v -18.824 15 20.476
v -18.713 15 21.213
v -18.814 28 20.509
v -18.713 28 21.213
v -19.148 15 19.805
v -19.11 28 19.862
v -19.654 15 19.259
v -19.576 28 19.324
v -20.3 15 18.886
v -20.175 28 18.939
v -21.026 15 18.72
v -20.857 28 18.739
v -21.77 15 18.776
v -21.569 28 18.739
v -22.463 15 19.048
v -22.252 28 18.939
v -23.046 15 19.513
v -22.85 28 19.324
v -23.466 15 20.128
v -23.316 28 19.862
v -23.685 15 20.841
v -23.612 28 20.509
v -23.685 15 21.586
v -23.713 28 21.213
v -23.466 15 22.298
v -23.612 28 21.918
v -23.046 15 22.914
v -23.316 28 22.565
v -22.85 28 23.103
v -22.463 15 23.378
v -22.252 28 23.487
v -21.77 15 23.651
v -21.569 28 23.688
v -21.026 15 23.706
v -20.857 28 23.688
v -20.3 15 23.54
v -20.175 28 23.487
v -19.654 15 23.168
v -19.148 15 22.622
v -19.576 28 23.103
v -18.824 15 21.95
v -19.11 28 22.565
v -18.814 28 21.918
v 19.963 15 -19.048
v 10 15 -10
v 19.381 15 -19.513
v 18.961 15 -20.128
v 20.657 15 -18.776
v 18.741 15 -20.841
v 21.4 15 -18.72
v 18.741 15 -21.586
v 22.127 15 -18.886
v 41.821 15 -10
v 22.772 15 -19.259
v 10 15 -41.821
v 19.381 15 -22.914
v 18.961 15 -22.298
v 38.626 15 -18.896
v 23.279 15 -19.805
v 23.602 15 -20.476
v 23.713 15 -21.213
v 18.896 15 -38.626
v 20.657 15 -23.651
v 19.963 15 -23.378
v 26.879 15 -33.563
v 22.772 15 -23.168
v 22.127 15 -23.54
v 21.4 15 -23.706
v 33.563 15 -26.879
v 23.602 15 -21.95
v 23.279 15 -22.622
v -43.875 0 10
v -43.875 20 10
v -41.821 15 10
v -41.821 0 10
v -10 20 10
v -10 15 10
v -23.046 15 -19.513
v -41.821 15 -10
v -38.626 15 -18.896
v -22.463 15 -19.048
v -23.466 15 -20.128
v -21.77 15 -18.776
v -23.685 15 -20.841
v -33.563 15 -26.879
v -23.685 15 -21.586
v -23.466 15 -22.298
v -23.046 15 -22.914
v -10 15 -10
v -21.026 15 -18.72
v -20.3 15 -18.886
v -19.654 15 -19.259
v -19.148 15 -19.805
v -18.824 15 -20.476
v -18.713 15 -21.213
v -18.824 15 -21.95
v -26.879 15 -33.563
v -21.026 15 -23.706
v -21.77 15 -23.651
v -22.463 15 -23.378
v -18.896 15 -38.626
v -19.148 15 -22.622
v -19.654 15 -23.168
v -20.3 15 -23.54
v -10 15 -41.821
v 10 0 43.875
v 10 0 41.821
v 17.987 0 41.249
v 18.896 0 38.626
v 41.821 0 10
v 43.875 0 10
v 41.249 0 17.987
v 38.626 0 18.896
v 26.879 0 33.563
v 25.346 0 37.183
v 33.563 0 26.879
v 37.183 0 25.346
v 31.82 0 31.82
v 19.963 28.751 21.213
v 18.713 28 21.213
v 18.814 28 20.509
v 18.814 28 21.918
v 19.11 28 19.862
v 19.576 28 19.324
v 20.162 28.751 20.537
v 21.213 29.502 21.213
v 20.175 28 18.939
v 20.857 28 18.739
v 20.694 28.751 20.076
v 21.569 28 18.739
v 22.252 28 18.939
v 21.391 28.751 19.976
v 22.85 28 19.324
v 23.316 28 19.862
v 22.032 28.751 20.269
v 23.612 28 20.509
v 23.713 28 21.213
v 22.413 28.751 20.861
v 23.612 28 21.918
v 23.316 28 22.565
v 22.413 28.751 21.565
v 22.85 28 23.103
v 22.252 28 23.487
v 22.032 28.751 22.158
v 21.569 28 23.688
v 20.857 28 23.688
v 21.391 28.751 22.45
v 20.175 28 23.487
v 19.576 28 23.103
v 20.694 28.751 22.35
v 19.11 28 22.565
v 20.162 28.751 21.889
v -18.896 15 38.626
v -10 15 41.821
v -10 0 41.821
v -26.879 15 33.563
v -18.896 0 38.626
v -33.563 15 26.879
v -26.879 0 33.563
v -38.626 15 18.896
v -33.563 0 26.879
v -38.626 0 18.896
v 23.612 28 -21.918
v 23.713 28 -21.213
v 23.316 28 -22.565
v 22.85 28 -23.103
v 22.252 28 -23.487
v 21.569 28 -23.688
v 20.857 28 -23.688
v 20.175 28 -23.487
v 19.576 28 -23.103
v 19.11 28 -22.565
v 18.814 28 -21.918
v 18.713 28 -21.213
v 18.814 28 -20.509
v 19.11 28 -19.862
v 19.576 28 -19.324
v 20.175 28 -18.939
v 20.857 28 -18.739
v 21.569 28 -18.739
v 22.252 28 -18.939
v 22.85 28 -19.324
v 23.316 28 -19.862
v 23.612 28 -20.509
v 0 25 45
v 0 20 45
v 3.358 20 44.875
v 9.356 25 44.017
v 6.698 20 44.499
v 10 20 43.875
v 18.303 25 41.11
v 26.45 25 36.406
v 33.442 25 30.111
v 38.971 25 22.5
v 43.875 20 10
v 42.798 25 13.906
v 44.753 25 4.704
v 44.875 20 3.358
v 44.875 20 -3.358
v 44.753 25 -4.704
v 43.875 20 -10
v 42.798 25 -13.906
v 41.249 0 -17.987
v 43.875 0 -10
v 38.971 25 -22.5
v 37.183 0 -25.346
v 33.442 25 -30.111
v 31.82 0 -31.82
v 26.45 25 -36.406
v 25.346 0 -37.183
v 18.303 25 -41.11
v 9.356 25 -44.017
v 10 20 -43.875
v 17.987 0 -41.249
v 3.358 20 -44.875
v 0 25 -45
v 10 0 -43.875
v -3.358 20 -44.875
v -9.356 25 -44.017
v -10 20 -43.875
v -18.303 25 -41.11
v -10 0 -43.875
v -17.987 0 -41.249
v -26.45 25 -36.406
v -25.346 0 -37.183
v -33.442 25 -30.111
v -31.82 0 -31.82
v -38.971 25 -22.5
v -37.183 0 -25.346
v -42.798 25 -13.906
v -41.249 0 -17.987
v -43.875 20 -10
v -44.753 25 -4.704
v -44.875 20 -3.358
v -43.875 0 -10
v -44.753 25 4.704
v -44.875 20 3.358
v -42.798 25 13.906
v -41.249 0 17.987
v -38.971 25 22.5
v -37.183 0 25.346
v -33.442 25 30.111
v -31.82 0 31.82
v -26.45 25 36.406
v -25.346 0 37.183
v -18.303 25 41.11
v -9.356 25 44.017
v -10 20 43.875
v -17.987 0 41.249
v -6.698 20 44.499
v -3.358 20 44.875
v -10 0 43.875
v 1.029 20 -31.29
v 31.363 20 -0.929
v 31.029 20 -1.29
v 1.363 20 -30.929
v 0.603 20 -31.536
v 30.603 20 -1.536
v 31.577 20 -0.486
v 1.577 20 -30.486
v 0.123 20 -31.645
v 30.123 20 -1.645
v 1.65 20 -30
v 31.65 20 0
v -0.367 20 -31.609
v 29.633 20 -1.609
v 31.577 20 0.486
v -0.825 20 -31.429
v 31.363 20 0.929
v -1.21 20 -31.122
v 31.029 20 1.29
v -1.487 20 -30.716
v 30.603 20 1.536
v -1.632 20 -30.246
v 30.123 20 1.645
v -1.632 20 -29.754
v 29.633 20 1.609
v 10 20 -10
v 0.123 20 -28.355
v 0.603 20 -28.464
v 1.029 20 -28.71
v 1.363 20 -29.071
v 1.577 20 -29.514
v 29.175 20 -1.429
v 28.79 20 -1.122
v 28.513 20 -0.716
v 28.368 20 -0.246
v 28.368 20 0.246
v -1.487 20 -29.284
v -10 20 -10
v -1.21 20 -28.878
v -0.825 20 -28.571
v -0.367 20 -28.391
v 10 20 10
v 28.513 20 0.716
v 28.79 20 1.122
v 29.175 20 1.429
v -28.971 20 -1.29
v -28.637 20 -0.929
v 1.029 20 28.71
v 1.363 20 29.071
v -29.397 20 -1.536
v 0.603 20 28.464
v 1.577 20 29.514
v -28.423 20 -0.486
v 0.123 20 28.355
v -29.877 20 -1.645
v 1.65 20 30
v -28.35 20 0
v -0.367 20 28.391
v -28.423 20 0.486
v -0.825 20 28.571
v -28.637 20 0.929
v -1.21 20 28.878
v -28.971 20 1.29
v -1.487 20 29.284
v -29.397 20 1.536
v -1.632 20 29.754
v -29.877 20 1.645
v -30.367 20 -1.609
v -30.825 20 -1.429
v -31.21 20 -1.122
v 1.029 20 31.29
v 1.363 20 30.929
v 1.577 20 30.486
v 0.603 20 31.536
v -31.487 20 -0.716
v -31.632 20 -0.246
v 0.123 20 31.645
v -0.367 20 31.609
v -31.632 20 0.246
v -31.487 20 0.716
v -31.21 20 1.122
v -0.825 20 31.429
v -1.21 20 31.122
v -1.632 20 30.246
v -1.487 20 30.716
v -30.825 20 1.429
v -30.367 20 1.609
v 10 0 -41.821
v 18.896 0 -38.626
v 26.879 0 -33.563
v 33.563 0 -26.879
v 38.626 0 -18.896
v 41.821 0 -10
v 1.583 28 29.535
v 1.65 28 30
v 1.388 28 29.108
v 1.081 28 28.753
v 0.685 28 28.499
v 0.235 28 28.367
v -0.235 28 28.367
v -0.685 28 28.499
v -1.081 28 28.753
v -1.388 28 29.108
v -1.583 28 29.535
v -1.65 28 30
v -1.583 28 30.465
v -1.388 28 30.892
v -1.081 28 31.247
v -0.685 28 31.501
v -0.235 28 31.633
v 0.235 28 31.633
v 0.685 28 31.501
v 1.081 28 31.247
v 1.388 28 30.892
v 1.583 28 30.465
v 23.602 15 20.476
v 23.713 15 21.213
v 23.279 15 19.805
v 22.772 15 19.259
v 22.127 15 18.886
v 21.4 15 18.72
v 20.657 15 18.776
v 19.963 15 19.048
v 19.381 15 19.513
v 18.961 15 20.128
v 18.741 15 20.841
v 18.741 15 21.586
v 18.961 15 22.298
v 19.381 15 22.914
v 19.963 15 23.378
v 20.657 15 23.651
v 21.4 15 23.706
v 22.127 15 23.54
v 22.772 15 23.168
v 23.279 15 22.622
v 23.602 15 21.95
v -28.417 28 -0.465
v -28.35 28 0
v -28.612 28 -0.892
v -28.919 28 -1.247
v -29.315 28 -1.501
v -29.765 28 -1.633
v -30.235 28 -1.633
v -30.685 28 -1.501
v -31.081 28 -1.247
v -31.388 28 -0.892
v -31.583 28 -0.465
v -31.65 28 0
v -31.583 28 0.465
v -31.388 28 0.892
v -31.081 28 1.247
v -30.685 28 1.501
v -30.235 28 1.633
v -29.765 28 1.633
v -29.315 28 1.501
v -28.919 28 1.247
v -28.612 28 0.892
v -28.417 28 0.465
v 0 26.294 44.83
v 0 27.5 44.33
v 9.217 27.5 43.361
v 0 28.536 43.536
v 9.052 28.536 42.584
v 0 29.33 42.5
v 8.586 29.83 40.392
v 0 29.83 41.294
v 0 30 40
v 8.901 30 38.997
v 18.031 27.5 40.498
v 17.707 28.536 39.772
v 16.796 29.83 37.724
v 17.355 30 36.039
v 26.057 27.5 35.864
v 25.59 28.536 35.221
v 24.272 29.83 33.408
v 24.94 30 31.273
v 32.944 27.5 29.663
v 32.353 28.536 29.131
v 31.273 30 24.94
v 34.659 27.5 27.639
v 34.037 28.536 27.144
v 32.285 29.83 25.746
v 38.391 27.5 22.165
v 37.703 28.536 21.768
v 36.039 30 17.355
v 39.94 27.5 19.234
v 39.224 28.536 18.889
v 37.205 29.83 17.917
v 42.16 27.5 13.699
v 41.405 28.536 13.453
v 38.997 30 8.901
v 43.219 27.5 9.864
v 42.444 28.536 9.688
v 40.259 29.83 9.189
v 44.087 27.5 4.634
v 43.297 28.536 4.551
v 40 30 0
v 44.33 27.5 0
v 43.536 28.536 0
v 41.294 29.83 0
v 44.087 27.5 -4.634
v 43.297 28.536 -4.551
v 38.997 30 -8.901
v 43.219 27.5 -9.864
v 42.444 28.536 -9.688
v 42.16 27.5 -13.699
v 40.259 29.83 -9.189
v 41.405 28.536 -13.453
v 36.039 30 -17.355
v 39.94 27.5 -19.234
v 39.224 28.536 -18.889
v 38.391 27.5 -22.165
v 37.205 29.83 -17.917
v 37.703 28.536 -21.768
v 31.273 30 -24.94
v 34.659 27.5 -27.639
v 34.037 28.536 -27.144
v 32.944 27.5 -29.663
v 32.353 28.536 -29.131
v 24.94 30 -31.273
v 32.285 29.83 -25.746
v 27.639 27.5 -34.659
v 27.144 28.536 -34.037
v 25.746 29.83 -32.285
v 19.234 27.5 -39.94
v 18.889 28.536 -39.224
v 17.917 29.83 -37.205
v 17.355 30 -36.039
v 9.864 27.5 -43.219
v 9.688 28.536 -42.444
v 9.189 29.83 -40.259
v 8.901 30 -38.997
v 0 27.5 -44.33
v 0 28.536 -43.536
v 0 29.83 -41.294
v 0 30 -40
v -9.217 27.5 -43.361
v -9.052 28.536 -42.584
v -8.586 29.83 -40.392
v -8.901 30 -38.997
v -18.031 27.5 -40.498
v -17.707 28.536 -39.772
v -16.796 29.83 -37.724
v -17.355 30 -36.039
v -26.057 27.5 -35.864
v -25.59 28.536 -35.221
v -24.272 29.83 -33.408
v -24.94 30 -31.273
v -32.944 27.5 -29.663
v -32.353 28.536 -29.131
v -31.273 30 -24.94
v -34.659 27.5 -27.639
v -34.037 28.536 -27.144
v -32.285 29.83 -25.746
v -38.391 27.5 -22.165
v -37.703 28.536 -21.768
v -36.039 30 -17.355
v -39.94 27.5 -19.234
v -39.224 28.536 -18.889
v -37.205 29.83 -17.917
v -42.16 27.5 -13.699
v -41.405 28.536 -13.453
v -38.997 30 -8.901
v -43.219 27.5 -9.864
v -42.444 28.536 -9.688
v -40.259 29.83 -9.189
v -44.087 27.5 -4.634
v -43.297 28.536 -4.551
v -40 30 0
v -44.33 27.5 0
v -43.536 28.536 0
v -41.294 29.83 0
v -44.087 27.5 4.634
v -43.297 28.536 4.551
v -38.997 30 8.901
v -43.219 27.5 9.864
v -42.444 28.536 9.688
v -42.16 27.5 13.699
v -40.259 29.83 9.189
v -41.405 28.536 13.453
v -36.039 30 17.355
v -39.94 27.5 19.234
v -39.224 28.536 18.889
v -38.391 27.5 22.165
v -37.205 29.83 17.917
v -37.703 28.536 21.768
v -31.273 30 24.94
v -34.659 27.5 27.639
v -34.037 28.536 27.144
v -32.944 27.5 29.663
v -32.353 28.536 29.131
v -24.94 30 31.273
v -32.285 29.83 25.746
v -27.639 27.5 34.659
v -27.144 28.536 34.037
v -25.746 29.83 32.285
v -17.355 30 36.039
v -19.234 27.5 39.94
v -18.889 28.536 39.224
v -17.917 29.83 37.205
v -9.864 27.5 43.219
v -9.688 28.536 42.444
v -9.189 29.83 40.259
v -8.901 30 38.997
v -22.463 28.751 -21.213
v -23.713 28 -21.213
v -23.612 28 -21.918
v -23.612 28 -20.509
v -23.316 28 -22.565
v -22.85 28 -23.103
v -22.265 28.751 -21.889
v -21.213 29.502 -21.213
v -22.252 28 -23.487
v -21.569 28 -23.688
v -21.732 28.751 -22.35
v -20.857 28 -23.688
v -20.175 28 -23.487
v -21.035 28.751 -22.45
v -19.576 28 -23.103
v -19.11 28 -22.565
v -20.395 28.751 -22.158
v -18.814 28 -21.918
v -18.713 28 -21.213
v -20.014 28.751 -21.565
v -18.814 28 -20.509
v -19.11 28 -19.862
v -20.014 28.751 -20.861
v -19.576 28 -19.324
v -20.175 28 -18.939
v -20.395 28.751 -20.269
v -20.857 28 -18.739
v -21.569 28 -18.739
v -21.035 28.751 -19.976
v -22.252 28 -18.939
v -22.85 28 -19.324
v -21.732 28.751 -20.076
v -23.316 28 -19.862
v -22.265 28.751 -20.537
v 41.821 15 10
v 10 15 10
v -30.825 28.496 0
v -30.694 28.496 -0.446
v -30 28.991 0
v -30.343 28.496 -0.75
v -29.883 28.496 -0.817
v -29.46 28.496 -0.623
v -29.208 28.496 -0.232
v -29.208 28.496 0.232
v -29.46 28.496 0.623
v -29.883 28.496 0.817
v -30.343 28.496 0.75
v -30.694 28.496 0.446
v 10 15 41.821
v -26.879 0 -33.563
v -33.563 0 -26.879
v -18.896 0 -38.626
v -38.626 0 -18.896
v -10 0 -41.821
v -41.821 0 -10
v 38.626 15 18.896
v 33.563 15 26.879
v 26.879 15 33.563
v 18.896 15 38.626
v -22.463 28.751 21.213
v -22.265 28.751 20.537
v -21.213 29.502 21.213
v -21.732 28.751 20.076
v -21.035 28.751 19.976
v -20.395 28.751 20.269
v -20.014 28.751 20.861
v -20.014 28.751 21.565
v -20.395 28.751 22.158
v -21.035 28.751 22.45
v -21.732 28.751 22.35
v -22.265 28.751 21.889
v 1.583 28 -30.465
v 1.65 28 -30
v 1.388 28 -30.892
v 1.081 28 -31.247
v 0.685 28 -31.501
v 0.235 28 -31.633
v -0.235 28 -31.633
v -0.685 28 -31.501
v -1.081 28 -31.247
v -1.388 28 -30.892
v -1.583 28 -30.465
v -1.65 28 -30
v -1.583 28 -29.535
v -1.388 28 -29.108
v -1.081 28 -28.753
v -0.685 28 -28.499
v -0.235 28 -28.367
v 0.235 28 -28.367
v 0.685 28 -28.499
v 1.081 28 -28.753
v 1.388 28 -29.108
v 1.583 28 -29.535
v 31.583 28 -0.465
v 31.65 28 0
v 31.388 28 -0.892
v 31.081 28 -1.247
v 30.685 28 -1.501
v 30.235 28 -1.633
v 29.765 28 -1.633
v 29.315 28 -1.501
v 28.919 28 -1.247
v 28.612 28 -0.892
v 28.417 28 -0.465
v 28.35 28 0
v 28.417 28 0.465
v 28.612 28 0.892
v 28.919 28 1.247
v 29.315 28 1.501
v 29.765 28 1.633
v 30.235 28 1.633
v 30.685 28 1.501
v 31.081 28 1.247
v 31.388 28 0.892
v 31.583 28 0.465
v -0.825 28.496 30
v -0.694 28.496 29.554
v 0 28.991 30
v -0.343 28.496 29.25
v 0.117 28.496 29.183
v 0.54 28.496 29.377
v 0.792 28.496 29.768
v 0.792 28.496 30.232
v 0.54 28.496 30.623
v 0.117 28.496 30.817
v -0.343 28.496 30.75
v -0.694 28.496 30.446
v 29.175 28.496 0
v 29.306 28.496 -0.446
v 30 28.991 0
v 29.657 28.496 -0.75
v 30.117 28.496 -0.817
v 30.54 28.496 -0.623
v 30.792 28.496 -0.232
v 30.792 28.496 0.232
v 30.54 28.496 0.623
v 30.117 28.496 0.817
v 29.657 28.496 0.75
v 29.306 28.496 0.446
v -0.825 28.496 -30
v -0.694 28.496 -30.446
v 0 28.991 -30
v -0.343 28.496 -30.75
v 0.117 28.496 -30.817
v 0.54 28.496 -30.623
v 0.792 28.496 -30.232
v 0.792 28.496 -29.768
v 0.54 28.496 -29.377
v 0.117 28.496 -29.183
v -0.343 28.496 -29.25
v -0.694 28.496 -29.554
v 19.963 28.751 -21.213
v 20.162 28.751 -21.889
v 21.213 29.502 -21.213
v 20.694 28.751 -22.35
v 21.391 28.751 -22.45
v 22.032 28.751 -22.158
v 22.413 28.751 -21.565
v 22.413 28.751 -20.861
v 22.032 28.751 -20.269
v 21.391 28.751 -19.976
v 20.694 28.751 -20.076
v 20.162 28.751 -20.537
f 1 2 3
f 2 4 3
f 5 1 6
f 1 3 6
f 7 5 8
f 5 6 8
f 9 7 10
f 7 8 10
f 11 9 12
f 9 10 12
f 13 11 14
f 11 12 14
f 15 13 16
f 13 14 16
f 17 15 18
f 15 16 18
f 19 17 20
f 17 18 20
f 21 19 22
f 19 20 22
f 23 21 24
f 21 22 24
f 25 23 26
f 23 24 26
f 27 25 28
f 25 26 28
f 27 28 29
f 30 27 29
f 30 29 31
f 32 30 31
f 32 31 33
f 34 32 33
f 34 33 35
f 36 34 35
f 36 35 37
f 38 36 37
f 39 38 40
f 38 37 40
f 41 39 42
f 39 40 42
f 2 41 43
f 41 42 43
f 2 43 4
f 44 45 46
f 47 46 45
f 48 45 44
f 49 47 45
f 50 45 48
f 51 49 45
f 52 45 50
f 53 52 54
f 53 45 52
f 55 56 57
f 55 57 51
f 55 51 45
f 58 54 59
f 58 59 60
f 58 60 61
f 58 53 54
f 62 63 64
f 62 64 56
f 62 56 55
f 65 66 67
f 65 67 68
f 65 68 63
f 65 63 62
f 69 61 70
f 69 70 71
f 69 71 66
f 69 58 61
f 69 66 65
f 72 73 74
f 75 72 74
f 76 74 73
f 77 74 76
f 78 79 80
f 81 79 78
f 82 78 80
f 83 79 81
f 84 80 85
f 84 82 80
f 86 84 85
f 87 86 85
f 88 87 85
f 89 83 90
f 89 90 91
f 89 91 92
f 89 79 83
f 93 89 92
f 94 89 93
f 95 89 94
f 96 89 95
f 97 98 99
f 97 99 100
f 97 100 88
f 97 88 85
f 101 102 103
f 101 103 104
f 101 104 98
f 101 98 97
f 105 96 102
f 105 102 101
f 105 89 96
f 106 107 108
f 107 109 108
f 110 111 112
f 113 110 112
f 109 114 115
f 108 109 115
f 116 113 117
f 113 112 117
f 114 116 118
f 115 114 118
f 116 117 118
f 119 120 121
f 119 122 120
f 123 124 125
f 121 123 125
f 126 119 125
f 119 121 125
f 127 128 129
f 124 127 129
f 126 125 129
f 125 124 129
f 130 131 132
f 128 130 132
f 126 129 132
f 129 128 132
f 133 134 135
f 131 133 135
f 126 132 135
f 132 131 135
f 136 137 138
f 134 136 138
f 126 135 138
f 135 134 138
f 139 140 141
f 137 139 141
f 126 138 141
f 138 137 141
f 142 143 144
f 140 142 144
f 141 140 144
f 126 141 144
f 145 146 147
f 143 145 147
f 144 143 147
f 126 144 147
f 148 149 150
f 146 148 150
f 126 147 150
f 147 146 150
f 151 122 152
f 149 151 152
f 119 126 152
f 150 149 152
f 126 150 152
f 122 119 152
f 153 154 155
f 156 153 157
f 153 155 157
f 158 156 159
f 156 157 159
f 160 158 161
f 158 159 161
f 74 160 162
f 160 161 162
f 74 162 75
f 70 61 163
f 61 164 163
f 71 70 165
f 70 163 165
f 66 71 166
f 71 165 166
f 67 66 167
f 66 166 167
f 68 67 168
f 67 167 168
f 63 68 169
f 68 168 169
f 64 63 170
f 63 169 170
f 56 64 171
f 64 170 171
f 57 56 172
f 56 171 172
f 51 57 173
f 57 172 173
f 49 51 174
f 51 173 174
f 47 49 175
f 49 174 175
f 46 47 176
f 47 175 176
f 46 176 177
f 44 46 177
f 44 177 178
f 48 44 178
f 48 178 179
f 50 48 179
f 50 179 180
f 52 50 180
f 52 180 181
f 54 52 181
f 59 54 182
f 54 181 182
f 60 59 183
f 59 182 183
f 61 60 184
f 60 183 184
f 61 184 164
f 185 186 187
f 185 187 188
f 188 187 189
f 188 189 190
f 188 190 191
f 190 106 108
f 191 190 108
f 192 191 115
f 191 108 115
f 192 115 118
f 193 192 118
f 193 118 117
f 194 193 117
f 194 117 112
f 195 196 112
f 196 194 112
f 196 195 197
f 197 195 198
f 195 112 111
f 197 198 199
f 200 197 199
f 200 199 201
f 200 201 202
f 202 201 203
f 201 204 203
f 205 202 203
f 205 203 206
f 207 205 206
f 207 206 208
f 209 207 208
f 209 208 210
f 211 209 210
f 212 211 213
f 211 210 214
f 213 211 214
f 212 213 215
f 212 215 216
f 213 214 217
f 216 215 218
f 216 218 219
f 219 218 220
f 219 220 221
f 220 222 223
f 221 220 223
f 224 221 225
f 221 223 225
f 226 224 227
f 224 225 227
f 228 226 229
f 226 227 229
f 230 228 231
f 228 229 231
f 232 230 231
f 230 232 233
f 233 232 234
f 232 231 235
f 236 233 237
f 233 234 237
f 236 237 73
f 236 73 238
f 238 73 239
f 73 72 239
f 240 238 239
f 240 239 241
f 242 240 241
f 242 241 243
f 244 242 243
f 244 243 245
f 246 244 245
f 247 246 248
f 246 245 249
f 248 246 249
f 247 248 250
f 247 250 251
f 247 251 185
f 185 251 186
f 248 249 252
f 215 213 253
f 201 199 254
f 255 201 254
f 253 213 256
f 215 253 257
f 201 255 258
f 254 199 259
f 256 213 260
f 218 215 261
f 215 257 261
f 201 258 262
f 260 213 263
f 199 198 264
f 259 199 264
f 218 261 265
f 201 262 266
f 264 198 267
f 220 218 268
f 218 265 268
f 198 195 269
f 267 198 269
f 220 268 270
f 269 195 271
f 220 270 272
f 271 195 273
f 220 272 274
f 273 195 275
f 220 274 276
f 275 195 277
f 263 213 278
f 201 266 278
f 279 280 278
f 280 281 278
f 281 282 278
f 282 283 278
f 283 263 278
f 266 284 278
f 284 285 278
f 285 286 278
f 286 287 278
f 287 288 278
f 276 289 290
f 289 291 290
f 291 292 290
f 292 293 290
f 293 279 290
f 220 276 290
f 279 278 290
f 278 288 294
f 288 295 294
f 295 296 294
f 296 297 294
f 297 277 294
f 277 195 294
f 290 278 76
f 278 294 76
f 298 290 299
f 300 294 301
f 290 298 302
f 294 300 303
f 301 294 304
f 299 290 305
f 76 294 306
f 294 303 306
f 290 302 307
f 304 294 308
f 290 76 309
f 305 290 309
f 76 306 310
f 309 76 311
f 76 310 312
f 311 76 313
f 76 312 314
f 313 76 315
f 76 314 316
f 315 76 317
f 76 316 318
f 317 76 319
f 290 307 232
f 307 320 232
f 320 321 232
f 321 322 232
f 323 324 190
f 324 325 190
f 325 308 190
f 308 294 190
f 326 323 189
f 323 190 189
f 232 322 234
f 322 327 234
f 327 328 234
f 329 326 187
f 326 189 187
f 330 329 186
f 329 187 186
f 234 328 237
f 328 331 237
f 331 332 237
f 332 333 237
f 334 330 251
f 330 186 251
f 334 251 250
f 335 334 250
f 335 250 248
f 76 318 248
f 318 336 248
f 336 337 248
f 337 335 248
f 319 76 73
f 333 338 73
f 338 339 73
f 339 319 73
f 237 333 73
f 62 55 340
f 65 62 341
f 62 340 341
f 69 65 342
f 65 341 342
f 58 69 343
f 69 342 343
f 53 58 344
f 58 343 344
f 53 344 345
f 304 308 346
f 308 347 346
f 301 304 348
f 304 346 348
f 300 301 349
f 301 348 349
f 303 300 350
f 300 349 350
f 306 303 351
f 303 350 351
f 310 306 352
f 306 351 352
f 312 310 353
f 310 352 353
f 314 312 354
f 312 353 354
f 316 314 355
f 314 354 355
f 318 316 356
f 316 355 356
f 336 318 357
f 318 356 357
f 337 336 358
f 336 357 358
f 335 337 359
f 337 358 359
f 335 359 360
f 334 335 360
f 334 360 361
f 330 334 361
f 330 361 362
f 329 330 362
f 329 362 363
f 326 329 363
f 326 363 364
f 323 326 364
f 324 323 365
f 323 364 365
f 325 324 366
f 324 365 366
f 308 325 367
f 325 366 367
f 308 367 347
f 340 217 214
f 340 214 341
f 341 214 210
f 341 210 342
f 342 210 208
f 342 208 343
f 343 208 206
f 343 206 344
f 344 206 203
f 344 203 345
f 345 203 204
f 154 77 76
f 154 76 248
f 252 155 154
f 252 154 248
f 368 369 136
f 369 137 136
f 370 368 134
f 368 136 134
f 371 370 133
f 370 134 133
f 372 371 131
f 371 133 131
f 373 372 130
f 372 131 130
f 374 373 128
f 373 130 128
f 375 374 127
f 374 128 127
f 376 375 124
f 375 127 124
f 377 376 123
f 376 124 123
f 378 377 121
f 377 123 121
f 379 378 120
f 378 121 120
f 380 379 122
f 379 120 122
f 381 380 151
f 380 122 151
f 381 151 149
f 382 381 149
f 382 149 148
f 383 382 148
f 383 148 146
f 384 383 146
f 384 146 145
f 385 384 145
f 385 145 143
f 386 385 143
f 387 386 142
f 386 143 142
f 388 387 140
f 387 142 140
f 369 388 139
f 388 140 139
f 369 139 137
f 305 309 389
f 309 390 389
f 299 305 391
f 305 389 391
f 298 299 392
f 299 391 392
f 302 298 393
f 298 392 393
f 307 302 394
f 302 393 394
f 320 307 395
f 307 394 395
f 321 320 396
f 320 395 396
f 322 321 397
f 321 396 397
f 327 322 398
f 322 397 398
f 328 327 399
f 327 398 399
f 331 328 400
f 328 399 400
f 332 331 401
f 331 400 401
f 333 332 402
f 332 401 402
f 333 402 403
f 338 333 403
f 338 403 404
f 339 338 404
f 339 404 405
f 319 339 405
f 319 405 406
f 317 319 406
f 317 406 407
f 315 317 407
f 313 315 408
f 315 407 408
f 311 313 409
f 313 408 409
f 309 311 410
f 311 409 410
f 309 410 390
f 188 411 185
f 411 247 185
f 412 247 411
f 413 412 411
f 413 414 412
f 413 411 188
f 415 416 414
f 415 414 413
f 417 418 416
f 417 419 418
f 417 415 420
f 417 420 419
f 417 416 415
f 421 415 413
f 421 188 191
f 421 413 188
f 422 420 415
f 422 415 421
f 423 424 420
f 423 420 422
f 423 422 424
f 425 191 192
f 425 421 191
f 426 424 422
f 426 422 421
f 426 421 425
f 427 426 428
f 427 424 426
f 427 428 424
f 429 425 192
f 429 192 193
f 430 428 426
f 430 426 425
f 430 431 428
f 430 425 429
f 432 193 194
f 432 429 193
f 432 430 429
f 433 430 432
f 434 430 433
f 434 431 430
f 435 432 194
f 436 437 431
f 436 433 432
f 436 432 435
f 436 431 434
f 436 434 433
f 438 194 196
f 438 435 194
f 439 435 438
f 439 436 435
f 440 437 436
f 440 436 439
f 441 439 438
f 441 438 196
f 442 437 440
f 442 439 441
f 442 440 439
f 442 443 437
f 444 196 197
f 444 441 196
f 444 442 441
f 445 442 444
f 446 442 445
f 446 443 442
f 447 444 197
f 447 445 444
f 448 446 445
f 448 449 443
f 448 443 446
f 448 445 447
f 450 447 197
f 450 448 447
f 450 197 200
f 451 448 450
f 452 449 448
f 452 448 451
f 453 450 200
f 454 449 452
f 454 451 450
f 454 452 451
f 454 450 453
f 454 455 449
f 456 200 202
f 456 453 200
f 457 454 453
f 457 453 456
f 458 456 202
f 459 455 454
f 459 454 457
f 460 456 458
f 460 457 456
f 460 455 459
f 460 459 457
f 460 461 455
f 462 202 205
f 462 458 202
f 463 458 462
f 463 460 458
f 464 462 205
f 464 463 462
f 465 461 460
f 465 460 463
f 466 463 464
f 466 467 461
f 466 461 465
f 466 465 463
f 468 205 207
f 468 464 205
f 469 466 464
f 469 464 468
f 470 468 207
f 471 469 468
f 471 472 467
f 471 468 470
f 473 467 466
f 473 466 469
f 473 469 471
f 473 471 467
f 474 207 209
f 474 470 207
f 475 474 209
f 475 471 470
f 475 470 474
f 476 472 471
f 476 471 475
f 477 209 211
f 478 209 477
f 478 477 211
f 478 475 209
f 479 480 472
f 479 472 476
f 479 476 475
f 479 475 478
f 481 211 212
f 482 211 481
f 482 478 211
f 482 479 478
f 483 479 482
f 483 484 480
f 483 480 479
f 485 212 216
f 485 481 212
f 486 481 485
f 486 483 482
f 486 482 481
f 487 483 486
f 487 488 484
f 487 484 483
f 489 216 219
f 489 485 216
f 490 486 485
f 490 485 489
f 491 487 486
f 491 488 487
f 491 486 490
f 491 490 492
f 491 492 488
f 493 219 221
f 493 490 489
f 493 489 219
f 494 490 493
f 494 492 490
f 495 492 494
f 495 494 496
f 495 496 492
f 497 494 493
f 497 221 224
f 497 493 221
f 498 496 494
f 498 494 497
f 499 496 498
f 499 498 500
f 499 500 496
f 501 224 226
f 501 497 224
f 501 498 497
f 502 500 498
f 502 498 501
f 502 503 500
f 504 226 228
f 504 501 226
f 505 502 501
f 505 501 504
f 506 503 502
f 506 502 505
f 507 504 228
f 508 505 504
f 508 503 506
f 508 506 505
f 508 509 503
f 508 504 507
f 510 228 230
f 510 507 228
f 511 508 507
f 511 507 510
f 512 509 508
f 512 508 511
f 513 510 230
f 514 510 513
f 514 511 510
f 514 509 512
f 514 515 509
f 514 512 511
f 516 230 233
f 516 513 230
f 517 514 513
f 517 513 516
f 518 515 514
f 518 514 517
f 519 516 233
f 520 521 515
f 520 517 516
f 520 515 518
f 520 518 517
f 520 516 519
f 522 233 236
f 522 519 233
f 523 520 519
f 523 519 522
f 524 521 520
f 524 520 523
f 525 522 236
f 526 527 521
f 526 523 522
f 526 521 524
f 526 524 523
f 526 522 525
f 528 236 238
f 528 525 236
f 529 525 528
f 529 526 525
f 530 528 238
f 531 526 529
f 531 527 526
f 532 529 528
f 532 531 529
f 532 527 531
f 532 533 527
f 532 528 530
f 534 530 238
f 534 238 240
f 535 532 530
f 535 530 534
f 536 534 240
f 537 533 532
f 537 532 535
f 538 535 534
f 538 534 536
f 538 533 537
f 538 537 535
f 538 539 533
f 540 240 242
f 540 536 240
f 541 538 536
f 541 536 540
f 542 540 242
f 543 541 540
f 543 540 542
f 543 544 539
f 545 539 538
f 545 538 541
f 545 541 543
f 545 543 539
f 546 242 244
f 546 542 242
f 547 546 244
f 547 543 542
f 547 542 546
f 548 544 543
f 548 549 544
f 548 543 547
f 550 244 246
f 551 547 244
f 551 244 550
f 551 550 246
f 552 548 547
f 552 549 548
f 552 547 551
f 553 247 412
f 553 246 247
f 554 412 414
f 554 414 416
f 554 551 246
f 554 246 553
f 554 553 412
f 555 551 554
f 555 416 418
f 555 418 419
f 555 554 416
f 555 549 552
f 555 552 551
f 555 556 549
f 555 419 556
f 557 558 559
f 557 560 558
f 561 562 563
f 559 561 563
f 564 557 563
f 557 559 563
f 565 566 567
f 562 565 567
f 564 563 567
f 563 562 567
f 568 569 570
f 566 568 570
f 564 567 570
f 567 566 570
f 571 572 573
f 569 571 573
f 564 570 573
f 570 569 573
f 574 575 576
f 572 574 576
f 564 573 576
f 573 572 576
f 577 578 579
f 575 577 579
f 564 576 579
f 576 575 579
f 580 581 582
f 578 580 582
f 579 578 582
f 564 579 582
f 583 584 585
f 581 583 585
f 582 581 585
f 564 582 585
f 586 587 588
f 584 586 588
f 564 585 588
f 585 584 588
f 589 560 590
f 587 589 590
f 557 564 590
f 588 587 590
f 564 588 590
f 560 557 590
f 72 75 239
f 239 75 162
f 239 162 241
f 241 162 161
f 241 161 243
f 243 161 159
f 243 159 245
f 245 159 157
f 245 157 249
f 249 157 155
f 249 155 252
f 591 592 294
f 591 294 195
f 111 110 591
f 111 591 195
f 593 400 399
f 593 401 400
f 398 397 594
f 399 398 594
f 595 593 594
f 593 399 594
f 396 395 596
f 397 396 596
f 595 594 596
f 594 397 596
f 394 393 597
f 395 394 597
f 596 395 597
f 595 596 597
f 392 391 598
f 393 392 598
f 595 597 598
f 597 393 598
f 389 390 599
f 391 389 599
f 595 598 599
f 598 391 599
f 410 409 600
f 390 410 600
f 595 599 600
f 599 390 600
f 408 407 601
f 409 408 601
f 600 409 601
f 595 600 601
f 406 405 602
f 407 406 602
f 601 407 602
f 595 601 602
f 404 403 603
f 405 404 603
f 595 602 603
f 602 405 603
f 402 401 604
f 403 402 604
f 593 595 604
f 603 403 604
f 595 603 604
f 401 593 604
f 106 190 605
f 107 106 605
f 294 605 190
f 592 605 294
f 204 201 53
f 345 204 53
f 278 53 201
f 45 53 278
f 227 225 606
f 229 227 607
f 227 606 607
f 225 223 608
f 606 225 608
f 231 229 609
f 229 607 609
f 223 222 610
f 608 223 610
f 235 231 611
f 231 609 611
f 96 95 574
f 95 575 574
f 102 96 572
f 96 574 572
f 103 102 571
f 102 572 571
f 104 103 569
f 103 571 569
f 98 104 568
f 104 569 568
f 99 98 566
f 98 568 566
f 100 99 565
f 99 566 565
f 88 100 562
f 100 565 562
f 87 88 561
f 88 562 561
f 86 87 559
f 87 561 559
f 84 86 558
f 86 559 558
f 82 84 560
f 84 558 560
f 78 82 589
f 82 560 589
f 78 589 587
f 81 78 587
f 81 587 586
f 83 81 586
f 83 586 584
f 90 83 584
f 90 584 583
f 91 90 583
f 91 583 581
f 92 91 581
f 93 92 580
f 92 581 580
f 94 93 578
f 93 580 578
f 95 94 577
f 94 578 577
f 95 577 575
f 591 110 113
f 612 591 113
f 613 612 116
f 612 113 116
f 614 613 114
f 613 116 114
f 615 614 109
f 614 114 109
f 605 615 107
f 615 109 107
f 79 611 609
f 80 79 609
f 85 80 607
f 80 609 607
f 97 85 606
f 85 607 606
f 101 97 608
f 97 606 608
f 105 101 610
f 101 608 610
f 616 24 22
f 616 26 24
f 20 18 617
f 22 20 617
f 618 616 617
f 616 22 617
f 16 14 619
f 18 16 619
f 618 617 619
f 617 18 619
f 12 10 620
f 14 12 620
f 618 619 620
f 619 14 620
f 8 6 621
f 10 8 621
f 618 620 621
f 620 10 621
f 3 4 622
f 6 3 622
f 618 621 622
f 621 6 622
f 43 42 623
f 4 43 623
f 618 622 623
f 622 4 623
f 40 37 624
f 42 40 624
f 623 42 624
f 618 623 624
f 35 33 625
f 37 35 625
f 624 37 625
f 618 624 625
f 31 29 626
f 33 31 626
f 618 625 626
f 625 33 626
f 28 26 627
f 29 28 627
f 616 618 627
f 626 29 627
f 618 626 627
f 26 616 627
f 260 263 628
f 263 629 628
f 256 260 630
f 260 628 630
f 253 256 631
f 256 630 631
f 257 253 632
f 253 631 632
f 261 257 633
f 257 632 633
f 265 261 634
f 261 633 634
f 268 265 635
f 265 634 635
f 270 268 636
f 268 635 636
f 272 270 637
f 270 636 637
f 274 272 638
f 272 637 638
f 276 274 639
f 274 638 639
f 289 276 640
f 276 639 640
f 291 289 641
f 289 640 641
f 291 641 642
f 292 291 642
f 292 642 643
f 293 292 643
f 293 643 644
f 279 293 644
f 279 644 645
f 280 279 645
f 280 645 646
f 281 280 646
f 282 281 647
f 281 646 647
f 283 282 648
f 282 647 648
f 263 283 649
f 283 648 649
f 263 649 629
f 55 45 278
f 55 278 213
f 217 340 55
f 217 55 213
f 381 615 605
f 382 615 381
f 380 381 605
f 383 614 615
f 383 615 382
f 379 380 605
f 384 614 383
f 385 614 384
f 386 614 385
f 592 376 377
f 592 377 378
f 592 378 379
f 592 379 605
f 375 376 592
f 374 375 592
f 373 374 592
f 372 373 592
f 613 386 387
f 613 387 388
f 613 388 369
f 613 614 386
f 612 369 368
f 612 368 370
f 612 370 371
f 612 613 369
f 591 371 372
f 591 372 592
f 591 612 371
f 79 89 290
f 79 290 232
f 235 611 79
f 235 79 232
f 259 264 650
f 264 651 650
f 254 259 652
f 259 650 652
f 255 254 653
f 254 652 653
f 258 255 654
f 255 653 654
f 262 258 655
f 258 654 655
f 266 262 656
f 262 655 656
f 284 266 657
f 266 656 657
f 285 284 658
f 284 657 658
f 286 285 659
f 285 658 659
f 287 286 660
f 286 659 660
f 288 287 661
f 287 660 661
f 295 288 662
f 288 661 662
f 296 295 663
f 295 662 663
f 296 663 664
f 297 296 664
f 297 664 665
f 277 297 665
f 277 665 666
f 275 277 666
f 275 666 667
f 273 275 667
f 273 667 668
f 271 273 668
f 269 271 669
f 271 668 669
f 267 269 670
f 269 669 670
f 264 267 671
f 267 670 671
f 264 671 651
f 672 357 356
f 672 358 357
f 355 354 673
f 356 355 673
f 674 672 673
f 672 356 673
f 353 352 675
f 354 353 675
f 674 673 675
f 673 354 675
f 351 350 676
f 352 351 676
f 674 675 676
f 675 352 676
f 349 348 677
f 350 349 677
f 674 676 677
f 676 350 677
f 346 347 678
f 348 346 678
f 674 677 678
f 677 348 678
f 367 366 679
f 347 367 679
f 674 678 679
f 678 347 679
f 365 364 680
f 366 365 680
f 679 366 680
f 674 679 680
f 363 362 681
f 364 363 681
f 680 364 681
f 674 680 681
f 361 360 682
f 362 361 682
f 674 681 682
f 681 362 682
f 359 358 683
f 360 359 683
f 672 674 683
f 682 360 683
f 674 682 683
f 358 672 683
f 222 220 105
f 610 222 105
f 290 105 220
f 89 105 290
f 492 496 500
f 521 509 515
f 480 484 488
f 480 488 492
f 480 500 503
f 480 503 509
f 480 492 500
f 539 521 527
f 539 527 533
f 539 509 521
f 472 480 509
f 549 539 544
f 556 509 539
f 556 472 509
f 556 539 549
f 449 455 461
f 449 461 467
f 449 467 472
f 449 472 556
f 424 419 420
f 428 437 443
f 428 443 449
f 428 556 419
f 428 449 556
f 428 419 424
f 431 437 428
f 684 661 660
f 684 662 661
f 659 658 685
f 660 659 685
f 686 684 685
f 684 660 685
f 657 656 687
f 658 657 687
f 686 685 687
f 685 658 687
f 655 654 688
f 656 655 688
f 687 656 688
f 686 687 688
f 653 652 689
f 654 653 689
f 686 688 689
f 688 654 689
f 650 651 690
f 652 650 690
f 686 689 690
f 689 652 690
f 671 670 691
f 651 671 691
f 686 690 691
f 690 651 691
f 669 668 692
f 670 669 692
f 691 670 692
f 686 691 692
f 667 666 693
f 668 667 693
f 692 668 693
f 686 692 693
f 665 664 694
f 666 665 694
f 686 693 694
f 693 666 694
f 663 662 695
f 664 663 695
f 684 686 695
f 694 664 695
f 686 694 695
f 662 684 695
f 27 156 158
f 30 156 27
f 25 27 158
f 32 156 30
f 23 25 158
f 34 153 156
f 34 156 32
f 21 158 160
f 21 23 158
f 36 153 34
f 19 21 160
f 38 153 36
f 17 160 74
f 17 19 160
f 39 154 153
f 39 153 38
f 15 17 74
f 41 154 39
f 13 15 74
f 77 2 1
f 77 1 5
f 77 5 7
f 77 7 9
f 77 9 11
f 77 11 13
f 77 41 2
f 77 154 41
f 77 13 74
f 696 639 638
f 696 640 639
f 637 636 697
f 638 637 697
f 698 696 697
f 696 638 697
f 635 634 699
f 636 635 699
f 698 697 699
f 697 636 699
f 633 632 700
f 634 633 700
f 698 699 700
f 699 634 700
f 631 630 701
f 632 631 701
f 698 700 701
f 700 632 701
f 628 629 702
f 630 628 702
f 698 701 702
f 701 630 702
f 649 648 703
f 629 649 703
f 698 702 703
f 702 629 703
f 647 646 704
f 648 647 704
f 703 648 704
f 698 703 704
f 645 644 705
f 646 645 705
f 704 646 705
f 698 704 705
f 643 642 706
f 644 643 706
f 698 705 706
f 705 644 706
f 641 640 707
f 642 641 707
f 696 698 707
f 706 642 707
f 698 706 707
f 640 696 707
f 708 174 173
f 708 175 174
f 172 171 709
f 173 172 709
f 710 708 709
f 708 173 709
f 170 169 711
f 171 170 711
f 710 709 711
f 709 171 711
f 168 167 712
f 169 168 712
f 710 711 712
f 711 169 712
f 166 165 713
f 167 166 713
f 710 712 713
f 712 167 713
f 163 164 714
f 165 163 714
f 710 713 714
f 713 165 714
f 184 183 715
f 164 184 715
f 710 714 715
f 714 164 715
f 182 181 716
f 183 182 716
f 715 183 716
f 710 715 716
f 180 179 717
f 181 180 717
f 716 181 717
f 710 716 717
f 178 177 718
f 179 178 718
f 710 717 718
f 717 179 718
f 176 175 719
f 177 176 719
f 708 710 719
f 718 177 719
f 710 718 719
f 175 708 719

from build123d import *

# Parameters (mm, degrees)
SKETCH_1_R             = 45
EXTRUDE_1_DEPTH        = 30
SKETCH_2_R             = 43
CUT_EXTRUDE_1_DEPTH    = 15
CUT_EXTRUDE_2_DEPTH    = 20
FILLET_1_R             = 5
HOLE_WIZARD_M6_1_D     = 5
HOLE_WIZARD_M6_1_DEPTH = 13
HOLE_WIZARD_M6_1_TIP   = 1.502151548
HOLE_WIZARD_M4_1_D     = 3.3
HOLE_WIZARD_M4_1_DEPTH = 8
HOLE_WIZARD_M4_1_TIP   = 0.991420021


with BuildPart() as part:
    # 草圖1 → 填料-伸長1 (new body)
    with BuildSketch(Plane(origin=(0, 0, 0), x_dir=(1, 0, 0), z_dir=(0, 1, 0))):
        with Locations(Location((0, 0, 0), (0, 0, 270))):
            Circle(SKETCH_1_R)
    extrude(amount=EXTRUDE_1_DEPTH)

    # 草圖2 → 除料-伸長1 (cut)
    with BuildSketch(Plane(origin=(0, 0, 0), x_dir=(-1, 0, 0), z_dir=(0, -1, 0))):
        with Locations(Location((0, 0, 0), (0, 0, 90))):
            Circle(SKETCH_2_R)
    extrude(amount=-CUT_EXTRUDE_1_DEPTH, mode=Mode.SUBTRACT)

    # 草圖3 → 除料-伸長2 (cut)
    with BuildSketch(Plane.XZ):
        Polygon((-47.5, 10), (-10, 10), (-10, 47.5), (10, 47.5), (10, 10), (47.5, 10), (47.5, -10), (10, -10), (10, -47.5), (-10, -47.5), (-10, -10), (-47.5, -10), align=None)
    extrude(amount=-CUT_EXTRUDE_2_DEPTH, mode=Mode.SUBTRACT)

    # 圓角1
    fillet_1_edges = [part.edges().sort_by_distance(p)[0] for p in [
        (0, 30, -45),
    ]]
    fillet(fillet_1_edges, radius=FILLET_1_R)

    # M6 螺紋孔1
    with Locations(Plane(origin=(0, 15, 0), x_dir=(-1, 0, 0), z_dir=(0, -1, 0))):
        with Locations((21.213203436, -21.213203436), (-21.213203436, 21.213203436), (-21.213203436, -21.213203436), (21.213203436, 21.213203436)):
            Hole(HOLE_WIZARD_M6_1_D / 2, depth=HOLE_WIZARD_M6_1_DEPTH)
            with Locations((0, 0, -(HOLE_WIZARD_M6_1_DEPTH + HOLE_WIZARD_M6_1_TIP / 2))):  # 118° drill point
                Cone(0, HOLE_WIZARD_M6_1_D / 2, HOLE_WIZARD_M6_1_TIP, mode=Mode.SUBTRACT)

    # M4 螺紋孔1
    with Locations(Plane(origin=(0, 20, 0), x_dir=(-1, 0, 0), z_dir=(0, -1, 0))):
        with Locations((0, -30), (0, 30), (30, 0), (-30, 0)):
            Hole(HOLE_WIZARD_M4_1_D / 2, depth=HOLE_WIZARD_M4_1_DEPTH)
            with Locations((0, 0, -(HOLE_WIZARD_M4_1_DEPTH + HOLE_WIZARD_M4_1_TIP / 2))):  # 118° drill point
                Cone(0, HOLE_WIZARD_M4_1_D / 2, HOLE_WIZARD_M4_1_TIP, mode=Mode.SUBTRACT)


solid = part.part
